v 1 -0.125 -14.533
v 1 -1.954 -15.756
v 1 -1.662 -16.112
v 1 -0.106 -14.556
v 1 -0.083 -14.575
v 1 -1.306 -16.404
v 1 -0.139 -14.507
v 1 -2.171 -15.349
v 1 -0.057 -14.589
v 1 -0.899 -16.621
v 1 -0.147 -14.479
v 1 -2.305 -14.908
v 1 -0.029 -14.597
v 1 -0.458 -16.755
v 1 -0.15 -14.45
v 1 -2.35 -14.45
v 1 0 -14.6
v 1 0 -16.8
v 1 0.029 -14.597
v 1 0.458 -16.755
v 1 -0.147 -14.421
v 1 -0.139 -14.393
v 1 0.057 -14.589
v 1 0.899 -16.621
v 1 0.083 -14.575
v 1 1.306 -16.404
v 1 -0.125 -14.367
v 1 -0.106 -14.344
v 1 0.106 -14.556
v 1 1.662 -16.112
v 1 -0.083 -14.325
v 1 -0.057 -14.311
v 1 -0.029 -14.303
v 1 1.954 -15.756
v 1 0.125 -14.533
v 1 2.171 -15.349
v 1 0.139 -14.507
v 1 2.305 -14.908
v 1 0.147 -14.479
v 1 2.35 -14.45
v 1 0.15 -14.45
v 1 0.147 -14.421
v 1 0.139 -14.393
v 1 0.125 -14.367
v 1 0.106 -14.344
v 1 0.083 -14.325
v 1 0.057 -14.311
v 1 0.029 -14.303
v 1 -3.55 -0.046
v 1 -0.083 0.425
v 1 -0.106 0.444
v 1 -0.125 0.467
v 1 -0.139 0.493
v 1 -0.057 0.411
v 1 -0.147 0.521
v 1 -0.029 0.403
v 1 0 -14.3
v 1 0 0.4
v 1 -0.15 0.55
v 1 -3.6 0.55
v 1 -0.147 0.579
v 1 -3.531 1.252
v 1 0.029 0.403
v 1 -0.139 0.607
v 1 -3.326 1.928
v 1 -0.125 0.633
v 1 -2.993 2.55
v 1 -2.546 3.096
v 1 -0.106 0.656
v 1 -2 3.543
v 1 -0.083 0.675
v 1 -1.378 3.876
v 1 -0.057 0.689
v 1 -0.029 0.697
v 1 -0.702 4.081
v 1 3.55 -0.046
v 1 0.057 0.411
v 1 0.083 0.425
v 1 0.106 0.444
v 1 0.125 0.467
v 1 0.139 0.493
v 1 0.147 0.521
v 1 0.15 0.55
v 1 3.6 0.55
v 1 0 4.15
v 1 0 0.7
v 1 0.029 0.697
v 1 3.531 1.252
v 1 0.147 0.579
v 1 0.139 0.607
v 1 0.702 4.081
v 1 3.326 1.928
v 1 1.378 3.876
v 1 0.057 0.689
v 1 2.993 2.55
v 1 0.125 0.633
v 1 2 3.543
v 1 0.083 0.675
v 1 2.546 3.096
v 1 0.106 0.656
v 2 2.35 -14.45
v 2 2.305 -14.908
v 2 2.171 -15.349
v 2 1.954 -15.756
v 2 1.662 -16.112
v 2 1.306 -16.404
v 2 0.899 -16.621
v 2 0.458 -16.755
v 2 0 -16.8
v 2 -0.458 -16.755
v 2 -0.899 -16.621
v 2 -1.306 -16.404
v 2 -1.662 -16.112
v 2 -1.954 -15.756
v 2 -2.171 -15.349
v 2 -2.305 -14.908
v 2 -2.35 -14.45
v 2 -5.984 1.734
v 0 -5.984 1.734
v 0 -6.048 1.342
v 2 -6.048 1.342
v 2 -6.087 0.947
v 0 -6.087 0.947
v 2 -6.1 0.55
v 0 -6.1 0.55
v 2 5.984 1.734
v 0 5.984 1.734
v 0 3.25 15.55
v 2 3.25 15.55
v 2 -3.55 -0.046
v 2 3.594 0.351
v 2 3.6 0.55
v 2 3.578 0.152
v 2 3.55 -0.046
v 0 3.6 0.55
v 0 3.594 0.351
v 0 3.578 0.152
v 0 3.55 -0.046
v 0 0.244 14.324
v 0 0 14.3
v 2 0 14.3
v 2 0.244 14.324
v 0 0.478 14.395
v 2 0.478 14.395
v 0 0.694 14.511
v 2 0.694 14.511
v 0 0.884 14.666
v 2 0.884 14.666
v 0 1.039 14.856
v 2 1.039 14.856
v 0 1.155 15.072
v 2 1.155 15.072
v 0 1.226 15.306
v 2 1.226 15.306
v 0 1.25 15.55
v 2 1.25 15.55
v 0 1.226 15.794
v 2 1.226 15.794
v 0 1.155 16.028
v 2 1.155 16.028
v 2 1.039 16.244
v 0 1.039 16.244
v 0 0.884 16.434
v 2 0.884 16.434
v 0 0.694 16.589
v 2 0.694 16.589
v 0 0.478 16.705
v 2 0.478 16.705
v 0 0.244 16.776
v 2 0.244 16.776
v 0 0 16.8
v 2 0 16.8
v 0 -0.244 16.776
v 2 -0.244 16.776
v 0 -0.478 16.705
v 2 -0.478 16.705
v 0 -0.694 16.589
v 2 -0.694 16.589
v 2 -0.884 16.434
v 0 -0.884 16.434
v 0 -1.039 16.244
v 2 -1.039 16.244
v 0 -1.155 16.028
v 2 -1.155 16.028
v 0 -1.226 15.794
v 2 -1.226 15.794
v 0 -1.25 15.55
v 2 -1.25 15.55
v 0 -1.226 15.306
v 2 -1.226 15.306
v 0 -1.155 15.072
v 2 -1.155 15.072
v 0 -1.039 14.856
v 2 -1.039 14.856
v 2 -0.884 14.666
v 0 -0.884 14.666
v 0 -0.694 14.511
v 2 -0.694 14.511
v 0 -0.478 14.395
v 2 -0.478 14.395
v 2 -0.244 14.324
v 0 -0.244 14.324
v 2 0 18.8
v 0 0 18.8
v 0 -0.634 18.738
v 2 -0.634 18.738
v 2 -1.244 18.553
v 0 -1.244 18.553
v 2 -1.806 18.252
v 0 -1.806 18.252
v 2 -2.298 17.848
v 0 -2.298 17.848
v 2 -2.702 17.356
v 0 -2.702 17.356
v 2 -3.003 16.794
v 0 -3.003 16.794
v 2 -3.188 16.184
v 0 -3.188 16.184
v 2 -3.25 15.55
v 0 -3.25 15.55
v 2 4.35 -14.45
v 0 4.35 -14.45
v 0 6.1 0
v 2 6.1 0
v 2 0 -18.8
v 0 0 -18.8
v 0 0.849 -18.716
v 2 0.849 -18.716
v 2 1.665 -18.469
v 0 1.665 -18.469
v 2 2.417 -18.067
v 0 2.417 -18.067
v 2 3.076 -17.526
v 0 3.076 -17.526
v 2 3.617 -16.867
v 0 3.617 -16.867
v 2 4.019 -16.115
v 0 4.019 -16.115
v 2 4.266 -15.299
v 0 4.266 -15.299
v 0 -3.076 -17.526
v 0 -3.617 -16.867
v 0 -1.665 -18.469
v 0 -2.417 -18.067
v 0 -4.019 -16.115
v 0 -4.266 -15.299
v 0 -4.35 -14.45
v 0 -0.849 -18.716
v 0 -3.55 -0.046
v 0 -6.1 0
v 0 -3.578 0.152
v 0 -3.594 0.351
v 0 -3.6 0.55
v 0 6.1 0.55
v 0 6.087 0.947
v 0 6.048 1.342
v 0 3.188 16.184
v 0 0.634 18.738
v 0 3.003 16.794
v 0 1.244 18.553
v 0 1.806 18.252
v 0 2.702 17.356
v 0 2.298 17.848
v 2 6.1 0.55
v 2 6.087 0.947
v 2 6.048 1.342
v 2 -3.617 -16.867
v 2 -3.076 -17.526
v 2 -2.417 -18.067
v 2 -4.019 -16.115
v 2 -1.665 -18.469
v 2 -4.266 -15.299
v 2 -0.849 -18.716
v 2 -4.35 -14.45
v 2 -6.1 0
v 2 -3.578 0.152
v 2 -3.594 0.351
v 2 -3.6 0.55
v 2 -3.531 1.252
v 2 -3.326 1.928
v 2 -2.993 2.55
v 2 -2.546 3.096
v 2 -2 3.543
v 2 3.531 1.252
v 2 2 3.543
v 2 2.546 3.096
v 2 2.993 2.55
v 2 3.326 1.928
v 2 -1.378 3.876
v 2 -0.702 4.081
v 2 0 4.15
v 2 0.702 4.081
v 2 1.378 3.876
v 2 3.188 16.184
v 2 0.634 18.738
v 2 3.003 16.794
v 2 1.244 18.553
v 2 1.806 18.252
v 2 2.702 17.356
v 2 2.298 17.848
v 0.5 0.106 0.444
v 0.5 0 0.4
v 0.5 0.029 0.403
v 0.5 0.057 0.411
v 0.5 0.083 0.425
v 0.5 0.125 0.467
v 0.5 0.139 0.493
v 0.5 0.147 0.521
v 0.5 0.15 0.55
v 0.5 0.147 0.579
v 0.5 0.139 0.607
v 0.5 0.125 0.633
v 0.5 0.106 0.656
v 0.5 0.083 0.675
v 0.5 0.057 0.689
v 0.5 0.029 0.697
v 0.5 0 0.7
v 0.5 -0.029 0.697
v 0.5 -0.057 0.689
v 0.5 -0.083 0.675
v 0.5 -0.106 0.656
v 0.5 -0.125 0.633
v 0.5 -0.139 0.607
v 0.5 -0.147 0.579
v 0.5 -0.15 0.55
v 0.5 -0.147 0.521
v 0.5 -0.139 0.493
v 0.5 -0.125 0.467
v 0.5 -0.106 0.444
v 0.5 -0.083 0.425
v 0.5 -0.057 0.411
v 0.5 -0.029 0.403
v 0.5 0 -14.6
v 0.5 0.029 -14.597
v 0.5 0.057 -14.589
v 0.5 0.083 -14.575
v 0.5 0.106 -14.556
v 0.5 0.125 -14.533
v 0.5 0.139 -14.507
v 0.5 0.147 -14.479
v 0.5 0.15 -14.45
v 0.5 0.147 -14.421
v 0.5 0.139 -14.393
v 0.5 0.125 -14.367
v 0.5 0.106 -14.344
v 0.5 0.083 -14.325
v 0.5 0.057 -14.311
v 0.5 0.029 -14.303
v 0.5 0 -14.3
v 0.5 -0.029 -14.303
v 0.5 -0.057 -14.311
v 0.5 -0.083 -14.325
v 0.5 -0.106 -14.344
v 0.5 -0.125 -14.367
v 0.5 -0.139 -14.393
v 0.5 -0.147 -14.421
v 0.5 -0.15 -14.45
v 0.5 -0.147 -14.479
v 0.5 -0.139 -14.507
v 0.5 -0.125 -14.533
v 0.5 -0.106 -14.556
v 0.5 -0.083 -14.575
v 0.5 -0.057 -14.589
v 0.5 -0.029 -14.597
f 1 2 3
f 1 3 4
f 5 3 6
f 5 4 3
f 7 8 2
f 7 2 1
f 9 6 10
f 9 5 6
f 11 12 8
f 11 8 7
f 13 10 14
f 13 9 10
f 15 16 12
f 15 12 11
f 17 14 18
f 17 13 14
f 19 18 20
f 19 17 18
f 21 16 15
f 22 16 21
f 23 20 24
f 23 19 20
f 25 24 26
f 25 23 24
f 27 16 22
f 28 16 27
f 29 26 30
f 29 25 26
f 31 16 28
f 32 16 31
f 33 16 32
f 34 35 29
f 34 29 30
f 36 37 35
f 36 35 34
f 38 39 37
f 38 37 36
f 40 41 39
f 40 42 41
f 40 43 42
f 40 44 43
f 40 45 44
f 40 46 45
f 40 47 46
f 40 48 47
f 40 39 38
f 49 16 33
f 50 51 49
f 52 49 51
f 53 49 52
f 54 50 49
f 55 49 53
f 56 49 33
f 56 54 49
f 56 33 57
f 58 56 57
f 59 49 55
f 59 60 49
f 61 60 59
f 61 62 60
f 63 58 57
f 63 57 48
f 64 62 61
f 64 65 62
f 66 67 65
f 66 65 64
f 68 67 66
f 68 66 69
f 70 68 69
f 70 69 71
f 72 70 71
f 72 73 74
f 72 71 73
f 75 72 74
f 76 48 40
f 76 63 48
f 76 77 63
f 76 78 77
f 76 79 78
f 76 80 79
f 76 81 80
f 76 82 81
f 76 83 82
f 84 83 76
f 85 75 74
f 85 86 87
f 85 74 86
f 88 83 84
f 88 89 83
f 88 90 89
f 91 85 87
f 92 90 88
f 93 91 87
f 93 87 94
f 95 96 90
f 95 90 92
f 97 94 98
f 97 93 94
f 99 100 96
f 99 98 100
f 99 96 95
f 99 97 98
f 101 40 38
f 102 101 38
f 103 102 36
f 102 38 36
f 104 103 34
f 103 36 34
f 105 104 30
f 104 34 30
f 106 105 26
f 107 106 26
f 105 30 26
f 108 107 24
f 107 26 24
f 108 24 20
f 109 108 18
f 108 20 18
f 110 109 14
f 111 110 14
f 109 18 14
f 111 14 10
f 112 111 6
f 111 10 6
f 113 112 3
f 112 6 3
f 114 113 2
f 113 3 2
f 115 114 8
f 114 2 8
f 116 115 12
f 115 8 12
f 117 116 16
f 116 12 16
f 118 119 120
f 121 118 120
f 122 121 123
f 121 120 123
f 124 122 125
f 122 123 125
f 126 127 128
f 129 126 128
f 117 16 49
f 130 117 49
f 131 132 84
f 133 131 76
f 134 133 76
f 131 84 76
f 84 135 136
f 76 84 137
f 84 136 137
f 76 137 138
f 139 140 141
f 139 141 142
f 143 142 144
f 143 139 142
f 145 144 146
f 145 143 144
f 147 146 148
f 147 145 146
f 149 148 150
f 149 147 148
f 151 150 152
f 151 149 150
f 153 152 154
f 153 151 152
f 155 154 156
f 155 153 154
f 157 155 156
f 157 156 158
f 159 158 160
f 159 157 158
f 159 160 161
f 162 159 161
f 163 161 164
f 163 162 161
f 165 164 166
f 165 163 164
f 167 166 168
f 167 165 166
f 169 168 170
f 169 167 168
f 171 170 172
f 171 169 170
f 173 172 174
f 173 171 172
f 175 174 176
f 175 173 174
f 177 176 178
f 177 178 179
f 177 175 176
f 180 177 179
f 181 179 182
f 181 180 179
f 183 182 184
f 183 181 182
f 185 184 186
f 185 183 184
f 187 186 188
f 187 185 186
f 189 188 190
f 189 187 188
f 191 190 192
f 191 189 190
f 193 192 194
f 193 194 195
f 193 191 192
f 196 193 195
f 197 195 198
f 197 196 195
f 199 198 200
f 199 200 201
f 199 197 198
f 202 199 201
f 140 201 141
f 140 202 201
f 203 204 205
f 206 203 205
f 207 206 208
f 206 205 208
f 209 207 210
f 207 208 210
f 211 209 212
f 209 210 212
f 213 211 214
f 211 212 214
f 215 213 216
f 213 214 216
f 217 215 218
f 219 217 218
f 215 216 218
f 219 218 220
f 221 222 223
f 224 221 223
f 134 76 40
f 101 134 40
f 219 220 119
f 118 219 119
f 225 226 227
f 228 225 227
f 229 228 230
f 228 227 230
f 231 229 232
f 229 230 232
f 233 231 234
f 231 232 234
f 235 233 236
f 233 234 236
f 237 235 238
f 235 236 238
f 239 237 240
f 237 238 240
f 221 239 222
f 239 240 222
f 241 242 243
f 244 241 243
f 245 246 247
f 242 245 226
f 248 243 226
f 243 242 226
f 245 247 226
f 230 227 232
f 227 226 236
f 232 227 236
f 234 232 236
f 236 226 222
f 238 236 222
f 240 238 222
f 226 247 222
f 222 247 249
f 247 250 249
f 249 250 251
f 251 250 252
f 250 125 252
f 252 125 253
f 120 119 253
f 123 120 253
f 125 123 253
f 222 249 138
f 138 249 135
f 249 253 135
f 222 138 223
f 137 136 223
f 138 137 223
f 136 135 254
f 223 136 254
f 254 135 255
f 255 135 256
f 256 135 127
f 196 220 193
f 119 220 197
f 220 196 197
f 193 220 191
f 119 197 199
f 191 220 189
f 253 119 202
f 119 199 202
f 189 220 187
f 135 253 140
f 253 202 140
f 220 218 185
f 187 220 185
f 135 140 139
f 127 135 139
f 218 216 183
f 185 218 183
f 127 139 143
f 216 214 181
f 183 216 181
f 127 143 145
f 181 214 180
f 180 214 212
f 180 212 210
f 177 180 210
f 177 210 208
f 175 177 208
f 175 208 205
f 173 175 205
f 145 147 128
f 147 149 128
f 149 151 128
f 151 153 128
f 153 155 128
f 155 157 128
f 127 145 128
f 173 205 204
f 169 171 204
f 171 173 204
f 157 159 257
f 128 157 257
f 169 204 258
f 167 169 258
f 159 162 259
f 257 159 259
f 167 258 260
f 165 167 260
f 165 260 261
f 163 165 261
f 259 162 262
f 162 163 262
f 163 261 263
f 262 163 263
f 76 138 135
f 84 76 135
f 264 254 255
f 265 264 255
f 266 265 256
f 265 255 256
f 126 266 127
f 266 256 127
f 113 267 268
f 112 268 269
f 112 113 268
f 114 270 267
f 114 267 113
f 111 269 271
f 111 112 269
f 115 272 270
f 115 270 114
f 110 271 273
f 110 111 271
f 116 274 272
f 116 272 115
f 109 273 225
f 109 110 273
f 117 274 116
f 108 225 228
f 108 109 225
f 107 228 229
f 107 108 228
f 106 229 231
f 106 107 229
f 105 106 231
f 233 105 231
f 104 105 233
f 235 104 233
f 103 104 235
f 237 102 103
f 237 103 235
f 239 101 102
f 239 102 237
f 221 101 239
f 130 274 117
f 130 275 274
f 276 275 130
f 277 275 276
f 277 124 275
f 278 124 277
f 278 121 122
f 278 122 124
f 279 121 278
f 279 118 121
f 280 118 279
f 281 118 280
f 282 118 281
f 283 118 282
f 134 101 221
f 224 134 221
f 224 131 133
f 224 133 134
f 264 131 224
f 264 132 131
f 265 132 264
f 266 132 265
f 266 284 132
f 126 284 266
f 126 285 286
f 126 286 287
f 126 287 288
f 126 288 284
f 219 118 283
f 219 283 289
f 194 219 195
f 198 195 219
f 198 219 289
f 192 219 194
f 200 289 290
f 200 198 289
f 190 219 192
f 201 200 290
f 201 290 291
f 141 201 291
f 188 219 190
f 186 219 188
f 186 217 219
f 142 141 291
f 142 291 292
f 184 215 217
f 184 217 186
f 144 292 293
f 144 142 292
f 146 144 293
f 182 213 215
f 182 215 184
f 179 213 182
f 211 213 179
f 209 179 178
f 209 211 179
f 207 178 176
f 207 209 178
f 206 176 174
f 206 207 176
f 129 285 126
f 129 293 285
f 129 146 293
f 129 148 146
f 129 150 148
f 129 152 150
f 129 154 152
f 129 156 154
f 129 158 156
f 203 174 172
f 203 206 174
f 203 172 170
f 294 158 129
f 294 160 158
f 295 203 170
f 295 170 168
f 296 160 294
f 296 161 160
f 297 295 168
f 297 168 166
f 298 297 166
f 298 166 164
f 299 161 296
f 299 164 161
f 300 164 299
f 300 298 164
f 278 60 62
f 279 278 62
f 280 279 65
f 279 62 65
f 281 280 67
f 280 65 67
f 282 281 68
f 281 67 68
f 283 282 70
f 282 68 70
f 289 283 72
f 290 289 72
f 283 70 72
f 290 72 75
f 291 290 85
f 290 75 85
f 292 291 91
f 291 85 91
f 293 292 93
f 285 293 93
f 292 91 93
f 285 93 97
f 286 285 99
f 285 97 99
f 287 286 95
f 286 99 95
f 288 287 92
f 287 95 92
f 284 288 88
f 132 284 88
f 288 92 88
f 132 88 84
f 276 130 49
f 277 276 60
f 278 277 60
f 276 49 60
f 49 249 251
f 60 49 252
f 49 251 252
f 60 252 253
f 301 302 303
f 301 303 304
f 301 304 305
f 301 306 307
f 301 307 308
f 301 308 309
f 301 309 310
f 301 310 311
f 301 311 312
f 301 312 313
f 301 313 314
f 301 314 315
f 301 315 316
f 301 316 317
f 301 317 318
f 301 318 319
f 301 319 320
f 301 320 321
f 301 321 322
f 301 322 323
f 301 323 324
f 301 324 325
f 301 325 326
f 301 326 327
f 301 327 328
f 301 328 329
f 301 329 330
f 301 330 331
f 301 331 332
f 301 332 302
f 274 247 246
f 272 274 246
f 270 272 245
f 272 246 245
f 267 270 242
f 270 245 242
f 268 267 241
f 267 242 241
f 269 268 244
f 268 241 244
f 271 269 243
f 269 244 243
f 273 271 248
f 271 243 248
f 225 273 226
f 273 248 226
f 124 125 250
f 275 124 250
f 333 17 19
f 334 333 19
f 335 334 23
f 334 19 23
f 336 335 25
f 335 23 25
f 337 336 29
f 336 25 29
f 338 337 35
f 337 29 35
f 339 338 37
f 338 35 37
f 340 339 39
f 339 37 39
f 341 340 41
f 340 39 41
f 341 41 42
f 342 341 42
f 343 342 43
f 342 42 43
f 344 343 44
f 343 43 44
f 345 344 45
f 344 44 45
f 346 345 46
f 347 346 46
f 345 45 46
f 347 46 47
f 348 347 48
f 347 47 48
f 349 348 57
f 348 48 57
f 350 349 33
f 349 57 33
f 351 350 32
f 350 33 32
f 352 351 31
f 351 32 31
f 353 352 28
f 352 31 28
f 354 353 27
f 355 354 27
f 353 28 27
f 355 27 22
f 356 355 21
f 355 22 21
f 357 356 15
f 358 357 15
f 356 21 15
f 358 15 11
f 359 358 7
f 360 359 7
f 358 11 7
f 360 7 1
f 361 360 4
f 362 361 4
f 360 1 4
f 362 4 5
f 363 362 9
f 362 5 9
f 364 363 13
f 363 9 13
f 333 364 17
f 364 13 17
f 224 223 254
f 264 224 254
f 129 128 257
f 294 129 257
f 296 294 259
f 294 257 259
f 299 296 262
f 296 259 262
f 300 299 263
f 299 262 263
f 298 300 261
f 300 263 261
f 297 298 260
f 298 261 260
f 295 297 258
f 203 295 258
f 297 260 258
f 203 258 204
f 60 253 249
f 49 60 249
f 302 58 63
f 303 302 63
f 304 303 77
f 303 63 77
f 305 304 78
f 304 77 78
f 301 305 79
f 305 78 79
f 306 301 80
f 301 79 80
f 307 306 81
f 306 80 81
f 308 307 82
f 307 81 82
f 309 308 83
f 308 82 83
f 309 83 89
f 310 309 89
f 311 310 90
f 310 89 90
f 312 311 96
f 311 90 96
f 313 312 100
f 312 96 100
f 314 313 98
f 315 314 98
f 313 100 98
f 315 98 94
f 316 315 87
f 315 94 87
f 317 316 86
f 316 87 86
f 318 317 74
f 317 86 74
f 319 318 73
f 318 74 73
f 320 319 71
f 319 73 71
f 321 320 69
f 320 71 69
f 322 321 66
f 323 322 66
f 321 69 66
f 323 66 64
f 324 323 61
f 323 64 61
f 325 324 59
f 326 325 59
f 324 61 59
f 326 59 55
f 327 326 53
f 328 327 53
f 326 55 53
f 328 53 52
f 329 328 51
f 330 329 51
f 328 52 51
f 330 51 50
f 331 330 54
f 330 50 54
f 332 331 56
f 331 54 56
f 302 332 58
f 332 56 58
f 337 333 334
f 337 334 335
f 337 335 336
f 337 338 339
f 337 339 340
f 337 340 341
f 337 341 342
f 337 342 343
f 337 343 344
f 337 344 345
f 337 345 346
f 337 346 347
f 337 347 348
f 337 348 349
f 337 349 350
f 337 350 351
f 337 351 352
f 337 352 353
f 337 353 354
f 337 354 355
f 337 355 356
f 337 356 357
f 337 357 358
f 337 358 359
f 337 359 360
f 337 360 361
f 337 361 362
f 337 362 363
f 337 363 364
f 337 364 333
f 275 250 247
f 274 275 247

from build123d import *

# Parameters (mm, degrees)
SKETCH2_R           = 1.25
BOSS_EXTRUDE1_DEPTH = 2
BOSS_EXTRUDE2_DEPTH = 1
SKETCH3_R           = 0.15
CUT_EXTRUDE1_DEPTH  = 0.5


with BuildPart() as part:
    # Sketch2 → Boss-Extrude1 (new body)
    with BuildSketch(Plane.YZ):
        with BuildLine():
            ThreePointArc((-4.35, -14.45), (-3.075914484, -17.525914513), (4.1e-08, -18.8))
            ThreePointArc((4.1e-08, -18.8), (3.075914513, -17.525914484), (4.35, -14.45))
            Line((4.35, -14.45), (6.1, 0))
            Line((6.1, 0), (6.1, 0.55))
            ThreePointArc((6.1, 0.55), (6.070921356, 1.144906627), (5.983962658, 1.734141424))
            Line((5.983962658, 1.734141424), (3.25, 15.55))
            ThreePointArc((3.25, 15.55), (2.298097039, 17.848097039), (0, 18.8))
            ThreePointArc((0, 18.8), (-2.298097039, 17.848097039), (-3.25, 15.55))
            Line((-3.25, 15.55), (-5.983962658, 1.734141424))
            ThreePointArc((-5.983962658, 1.734141424), (-6.070921356, 1.144906627), (-6.1, 0.55))
            Line((-6.1, 0.55), (-6.1, 0))
            Line((-6.1, 0), (-4.35, -14.45))
        make_face()
        with BuildLine():
            Line((3.550344828, -0.045862069), (2.35, -14.45))
            ThreePointArc((2.35, -14.45), (0, -16.8), (-2.35, -14.45))
            Line((-2.35, -14.45), (-3.550344828, -0.045862069))
            ThreePointArc((-3.550344828, -0.045862069), (-3.58756473, 0.251036273), (-3.6, 0.55))
            ThreePointArc((-3.6, 0.55), (0, 4.15), (3.6, 0.55))
            ThreePointArc((3.6, 0.55), (3.58756473, 0.251036273), (3.550344828, -0.045862069))
        make_face(mode=Mode.SUBTRACT)
        with Locations((0, 15.55)):
            Circle(SKETCH2_R, mode=Mode.SUBTRACT)
    extrude(amount=BOSS_EXTRUDE1_DEPTH)

    # Sketch2<3> → Boss-Extrude2 (add)
    with BuildSketch(Plane.YZ):
        with BuildLine():
            ThreePointArc((-2.35, -14.45), (0, -16.8), (2.35, -14.45))
            Line((2.35, -14.45), (3.550344828, -0.045862069))
            Line((3.550344828, -0.045862069), (3.6, 0.55))
            ThreePointArc((3.6, 0.55), (0, 4.15), (-3.6, 0.55))
            Line((-3.6, 0.55), (-3.550344828, -0.045862069))
            Line((-3.550344828, -0.045862069), (-2.35, -14.45))
        make_face()
    extrude(amount=BOSS_EXTRUDE2_DEPTH)

    # Sketch3 → Cut-Extrude1 (cut)
    with BuildSketch(Plane.YZ.offset(1)):
        with Locations((0, 0.55)):
            Circle(SKETCH3_R)
        with Locations((0, -14.45)):
            Circle(SKETCH3_R)
    extrude(amount=-CUT_EXTRUDE1_DEPTH, mode=Mode.SUBTRACT)


solid = part.part
